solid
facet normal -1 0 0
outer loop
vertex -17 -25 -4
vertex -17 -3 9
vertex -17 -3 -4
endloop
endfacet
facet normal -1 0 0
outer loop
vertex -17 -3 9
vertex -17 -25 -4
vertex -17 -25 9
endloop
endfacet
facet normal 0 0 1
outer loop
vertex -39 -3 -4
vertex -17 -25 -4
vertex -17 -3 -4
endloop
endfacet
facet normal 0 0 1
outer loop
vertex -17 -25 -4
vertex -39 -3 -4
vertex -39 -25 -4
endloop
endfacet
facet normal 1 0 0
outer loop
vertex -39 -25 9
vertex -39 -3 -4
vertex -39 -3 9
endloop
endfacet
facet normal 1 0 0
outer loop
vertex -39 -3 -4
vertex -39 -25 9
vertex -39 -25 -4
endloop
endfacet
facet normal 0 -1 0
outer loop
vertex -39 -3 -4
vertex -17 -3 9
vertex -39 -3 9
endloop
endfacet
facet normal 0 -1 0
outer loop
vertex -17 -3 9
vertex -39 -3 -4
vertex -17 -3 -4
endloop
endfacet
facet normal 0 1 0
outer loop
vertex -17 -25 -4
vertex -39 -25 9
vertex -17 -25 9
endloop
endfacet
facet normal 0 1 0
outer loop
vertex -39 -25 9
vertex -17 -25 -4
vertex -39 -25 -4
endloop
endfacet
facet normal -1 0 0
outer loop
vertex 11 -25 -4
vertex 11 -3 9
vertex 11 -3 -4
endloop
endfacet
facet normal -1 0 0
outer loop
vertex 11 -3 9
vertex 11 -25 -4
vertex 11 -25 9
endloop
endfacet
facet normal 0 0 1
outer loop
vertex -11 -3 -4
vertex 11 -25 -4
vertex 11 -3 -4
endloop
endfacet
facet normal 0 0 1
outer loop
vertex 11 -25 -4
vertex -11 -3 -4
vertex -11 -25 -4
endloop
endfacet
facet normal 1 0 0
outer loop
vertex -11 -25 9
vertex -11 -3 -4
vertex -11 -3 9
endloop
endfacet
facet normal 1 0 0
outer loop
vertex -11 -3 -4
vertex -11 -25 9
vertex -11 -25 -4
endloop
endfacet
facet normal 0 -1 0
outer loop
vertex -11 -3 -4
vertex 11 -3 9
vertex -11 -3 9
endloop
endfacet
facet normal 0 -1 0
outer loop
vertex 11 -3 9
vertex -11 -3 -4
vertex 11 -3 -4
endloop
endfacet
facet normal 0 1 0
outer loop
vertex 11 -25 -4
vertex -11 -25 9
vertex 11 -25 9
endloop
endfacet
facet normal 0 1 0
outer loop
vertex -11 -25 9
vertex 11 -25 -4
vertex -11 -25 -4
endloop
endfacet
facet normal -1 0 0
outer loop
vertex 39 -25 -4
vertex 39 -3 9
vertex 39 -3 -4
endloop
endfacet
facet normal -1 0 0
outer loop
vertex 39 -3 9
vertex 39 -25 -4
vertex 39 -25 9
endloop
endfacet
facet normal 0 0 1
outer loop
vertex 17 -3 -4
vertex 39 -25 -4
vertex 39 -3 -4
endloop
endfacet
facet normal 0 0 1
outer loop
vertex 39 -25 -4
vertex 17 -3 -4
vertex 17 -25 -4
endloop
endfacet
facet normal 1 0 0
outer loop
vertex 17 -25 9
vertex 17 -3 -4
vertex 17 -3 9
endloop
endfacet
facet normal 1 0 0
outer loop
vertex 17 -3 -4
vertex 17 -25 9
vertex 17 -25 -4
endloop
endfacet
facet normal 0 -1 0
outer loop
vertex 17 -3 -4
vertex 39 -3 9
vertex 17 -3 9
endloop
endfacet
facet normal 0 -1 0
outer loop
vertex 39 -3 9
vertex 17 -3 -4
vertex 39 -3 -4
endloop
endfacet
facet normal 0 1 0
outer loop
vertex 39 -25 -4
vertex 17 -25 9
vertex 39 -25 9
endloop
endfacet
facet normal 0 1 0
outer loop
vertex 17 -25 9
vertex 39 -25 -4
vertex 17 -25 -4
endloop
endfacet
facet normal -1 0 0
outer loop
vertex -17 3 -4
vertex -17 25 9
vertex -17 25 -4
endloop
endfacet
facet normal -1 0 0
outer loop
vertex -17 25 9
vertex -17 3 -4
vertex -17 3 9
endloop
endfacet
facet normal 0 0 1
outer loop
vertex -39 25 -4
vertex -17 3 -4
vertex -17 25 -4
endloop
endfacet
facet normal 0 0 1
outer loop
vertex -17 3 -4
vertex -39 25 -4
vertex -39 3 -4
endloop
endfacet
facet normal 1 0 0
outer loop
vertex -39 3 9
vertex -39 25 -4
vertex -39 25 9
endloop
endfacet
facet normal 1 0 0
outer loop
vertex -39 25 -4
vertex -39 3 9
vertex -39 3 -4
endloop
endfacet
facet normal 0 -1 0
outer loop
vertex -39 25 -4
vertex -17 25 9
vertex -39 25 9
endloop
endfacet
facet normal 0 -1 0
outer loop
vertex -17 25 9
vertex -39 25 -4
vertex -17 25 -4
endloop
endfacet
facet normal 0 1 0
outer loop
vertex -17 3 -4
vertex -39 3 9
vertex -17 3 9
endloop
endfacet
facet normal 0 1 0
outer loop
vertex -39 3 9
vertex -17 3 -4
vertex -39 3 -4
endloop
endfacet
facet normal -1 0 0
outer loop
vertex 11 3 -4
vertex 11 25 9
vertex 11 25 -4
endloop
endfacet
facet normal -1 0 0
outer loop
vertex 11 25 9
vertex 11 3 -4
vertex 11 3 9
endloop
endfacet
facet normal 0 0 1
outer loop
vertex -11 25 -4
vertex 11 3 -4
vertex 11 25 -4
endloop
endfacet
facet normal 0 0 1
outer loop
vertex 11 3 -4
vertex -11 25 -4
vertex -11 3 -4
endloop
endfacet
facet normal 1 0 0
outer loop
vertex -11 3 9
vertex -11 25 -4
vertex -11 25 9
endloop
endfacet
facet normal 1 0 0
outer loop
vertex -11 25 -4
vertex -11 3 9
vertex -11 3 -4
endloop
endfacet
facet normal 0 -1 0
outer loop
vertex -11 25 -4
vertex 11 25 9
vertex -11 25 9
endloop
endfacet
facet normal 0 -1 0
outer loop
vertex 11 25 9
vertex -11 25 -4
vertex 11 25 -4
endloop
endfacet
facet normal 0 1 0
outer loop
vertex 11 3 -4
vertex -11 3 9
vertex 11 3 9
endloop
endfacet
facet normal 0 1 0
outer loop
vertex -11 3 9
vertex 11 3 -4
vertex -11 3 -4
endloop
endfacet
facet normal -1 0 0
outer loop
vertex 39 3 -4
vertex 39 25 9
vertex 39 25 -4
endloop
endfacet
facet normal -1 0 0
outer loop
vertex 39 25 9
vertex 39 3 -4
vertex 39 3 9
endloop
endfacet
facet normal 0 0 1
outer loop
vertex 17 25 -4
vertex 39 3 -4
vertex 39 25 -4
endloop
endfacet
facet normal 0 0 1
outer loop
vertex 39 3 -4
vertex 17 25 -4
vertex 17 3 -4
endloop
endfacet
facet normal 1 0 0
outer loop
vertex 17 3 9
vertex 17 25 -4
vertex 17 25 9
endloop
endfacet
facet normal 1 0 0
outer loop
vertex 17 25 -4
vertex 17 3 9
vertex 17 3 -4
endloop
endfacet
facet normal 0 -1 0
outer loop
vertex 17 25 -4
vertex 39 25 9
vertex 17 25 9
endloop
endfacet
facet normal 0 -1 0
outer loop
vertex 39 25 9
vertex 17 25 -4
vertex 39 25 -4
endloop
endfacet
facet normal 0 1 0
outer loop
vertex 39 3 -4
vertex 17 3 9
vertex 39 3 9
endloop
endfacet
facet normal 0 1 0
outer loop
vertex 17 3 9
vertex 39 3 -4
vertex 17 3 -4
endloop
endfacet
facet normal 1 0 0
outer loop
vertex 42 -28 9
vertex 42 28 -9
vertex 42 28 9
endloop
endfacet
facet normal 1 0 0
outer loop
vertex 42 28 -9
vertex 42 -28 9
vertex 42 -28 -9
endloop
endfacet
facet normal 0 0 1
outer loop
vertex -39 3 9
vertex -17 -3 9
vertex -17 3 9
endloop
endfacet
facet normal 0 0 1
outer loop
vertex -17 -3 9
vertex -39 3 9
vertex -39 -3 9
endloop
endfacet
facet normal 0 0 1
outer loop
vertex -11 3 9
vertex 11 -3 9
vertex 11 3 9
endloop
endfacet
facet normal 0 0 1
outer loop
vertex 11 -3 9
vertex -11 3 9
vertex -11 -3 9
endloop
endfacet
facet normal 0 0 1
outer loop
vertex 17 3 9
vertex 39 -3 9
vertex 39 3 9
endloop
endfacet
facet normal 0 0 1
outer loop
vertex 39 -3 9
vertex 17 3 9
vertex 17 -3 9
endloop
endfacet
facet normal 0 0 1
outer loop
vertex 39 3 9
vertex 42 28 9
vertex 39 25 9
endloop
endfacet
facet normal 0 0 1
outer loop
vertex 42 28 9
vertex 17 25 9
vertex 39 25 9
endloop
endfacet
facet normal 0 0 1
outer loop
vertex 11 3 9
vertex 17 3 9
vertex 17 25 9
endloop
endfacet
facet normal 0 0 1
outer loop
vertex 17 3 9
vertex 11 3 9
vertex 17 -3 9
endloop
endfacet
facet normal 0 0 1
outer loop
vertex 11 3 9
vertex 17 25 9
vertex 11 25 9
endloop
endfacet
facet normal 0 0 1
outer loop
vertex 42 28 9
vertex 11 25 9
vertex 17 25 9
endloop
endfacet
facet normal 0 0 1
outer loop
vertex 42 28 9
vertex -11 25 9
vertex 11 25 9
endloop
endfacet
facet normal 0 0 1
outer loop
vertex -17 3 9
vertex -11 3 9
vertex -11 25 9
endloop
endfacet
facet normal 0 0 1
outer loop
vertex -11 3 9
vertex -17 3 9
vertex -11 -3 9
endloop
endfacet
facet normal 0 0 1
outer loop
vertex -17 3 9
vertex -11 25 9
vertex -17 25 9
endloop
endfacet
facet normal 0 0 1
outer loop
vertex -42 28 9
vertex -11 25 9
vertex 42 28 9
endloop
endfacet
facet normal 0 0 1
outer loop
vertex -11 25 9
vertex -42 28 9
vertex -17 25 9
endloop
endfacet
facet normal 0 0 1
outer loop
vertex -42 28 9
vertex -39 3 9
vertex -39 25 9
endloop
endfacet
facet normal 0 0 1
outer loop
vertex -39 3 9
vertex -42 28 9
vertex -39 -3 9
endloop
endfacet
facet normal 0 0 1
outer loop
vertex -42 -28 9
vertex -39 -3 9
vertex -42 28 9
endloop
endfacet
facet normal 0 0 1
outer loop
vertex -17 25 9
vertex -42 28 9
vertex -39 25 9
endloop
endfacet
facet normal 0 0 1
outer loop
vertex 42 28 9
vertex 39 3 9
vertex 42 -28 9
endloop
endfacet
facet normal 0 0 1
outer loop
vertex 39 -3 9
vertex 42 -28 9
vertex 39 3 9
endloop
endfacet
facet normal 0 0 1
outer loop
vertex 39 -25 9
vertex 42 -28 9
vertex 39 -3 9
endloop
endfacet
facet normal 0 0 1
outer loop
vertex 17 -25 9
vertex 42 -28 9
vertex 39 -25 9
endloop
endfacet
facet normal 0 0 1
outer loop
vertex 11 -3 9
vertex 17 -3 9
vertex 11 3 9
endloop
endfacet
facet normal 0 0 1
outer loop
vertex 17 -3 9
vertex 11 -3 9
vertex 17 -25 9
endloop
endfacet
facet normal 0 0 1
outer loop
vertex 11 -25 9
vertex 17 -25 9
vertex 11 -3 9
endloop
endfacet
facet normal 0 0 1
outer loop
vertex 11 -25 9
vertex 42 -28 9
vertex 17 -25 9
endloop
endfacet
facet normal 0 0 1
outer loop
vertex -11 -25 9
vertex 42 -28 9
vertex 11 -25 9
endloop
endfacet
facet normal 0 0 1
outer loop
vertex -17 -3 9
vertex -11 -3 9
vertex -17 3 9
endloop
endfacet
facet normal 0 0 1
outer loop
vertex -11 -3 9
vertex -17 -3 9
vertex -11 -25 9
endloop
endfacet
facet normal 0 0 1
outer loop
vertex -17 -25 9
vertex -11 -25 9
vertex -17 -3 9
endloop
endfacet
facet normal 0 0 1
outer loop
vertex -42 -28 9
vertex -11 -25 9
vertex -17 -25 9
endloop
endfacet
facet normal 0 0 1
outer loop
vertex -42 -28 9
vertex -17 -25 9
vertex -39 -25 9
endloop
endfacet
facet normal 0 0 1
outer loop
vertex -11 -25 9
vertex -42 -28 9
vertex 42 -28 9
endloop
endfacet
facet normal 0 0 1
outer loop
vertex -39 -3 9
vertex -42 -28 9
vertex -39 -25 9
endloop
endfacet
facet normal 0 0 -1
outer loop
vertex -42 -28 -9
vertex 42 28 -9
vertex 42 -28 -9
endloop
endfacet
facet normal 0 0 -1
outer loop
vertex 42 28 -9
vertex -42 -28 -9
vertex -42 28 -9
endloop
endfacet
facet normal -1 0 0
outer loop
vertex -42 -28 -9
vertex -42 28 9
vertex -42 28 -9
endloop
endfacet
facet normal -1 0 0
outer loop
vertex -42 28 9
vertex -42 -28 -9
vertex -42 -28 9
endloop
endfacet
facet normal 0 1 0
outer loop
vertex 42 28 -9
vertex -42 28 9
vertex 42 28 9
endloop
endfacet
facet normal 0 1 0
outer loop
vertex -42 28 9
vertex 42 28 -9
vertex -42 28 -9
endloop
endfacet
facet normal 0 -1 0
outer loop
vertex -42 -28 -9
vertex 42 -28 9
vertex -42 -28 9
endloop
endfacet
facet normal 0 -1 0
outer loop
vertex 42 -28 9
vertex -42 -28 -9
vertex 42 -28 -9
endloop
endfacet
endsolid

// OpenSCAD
$fn = 32;

// ----------------------------------------------------------------------
// Pocket plate 84 x 56 x 18
// 2 x 3 pockets 22 mm square, 13 mm deep
// ----------------------------------------------------------------------

// --- parameters (mm) ---
thickness = 18;  // plate thickness
floor_t = 5;     // material left under each pocket
pocket = 22;     // pocket side length
pitch_x = 28;    // pocket pitch along X
pitch_y = 28;    // pocket pitch along Y
cols = 3;        // pockets per row
rows = 2;        // rows of pockets

// --- derived feature positions (mm) ---
depth = thickness - floor_t;        // = 13   pocket depth, down to the floor
span_x = (cols - 1) * pitch_x;      // = 56   distance between outer pockets
span_y = (rows - 1) * pitch_y;      // = 28   distance between outer pocket rows
origin_x = -span_x / 2;             // = -28   X of the first pocket
origin_y = -span_y / 2;             // = -14   Y of the first pocket
plate = [span_x + pocket + 6, span_y + pocket + 6, thickness];  // = [84, 56, 18]   overall size: pockets plus 3 mm of wall on each side
feature_centers = [
  [origin_x + 0 * pitch_x, origin_y + 0 * pitch_y],
  [origin_x + 1 * pitch_x, origin_y + 0 * pitch_y],
  [origin_x + 2 * pitch_x, origin_y + 0 * pitch_y],
  [origin_x + 0 * pitch_x, origin_y + 1 * pitch_y],
  [origin_x + 1 * pitch_x, origin_y + 1 * pitch_y],
  [origin_x + 2 * pitch_x, origin_y + 1 * pitch_y]
];   // pocket centres, used verbatim by the cutter loop

// plate outline, then one pocket per centre in feature_centers
difference() {
  cube(plate, center = true);
  for (centre = feature_centers)
    translate([centre[0] - pocket / 2, centre[1] - pocket / 2, plate[2] / 2 - depth])
      cube([pocket, pocket, depth + 1]);  // centred on the declared pocket centre
}
